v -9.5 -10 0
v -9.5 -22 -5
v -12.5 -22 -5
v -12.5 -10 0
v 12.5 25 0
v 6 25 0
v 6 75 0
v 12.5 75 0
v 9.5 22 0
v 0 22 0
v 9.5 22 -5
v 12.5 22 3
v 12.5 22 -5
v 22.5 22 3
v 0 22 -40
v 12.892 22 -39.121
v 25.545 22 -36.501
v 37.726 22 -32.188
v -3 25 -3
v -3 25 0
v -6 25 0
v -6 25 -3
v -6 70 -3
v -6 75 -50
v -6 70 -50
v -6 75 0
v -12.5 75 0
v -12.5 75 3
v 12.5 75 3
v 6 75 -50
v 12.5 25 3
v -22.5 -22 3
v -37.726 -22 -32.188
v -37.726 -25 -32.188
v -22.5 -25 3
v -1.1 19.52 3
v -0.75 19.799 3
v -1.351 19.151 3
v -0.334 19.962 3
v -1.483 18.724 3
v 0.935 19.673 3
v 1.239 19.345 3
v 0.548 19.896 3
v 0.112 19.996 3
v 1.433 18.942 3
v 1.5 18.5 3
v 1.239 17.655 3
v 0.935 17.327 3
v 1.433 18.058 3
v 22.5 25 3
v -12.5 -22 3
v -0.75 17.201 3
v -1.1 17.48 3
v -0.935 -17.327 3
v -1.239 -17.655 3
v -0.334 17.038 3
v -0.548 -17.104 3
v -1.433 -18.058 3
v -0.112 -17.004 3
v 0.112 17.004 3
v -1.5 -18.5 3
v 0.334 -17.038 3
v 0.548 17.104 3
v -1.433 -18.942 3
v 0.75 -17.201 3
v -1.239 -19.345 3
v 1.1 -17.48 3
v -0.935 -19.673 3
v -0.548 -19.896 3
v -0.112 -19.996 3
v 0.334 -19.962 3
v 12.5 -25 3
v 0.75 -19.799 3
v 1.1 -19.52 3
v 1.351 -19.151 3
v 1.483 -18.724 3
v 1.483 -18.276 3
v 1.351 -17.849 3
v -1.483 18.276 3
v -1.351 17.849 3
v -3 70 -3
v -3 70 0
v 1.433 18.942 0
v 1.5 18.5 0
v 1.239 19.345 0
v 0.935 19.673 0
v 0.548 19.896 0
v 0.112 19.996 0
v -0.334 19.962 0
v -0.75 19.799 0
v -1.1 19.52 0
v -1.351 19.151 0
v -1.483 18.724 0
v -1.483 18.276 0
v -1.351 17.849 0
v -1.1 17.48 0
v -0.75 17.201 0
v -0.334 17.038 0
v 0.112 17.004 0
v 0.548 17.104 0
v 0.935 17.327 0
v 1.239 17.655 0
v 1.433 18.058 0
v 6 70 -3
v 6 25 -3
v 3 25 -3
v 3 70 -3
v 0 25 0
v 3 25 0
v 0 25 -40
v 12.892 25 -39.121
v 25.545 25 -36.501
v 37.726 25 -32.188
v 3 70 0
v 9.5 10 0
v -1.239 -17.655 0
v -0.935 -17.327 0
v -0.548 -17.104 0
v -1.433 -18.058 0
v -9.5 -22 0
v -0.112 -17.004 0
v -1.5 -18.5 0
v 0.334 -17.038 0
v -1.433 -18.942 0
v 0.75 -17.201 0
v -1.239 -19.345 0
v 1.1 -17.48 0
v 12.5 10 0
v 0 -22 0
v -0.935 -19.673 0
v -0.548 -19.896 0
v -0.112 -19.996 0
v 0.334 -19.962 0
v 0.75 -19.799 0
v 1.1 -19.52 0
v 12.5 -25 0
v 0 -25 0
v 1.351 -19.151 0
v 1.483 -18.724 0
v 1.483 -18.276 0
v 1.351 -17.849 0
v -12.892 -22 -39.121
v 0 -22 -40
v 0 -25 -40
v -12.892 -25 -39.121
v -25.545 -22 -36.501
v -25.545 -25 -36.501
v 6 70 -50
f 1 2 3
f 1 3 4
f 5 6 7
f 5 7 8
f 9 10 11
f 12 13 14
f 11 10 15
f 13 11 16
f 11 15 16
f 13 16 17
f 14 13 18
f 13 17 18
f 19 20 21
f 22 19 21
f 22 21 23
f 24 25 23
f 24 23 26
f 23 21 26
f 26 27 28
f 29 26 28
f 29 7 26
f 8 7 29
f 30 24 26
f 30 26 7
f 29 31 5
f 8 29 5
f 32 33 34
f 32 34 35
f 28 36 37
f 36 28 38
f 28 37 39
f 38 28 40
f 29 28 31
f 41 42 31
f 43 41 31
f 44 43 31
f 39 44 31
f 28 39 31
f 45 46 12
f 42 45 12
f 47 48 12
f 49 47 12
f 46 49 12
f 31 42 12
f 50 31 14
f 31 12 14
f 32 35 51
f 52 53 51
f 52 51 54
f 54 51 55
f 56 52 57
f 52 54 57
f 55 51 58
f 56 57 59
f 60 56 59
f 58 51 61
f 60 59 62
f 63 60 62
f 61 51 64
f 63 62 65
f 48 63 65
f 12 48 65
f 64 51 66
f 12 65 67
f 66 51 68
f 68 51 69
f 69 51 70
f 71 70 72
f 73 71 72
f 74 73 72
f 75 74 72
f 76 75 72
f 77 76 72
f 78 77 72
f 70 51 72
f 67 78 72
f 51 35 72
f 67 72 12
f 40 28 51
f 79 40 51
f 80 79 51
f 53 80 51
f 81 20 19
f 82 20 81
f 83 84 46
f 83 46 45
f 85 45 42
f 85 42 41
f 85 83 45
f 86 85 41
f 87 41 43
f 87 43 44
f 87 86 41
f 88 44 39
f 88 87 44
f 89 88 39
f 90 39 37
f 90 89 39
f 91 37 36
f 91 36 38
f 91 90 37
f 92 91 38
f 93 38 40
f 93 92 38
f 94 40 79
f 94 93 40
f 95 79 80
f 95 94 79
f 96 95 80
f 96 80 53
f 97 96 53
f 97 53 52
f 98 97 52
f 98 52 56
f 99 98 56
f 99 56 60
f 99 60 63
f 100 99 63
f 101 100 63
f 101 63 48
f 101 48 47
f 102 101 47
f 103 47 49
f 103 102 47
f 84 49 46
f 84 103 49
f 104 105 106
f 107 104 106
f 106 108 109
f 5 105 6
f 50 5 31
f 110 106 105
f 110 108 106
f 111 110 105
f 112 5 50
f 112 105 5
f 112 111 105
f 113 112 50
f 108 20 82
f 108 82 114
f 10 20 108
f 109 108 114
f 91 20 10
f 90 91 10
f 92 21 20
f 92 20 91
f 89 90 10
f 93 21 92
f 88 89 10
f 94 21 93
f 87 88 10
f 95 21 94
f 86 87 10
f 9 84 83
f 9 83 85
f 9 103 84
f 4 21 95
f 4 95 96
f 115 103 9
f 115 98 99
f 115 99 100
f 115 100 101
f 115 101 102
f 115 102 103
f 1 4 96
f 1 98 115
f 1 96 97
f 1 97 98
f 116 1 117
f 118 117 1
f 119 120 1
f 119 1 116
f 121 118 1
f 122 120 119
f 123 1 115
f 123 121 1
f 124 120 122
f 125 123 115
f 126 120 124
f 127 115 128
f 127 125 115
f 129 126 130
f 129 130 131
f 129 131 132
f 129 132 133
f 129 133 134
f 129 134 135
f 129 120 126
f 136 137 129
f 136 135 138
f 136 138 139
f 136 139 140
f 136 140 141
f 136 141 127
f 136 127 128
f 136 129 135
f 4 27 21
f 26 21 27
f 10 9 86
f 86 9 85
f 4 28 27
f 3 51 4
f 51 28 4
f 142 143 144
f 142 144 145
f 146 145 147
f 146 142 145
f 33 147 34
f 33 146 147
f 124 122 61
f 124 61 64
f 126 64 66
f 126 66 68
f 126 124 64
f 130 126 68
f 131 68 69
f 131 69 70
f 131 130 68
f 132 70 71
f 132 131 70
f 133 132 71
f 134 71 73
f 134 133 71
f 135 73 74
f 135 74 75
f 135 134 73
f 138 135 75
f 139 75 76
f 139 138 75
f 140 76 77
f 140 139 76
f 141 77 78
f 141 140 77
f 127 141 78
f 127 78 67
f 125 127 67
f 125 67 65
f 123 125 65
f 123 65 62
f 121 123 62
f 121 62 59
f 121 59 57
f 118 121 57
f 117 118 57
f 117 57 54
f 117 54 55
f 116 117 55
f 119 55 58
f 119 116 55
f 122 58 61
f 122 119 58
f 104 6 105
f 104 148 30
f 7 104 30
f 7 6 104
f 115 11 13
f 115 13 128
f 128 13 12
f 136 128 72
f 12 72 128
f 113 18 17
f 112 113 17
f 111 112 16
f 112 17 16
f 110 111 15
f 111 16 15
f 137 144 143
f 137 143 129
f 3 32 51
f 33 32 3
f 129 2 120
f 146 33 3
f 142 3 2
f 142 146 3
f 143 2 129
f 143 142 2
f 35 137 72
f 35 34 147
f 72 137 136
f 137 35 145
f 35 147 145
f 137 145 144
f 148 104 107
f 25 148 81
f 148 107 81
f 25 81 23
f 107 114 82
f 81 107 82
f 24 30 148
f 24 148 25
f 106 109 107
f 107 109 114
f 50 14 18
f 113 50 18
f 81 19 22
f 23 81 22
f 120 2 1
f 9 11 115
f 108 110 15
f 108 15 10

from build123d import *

# Parameters (mm, degrees)
SKETCH_1_W               = 25
SKETCH_1_H               = 50
SKETCH_1_R               = 1.5
EXTRUDE_1_DEPTH          = 3
EXTRUDE_START            = 22
EXTRUDE_2_DEPTH          = 3
CUT_EXTRUDE_1_DEPTH      = 3
CUT_EXTRUDE_2_DEPTH      = 3
RIB_1_REACH              = 70.903
SKETCH_7_WALL_W          = 152.805886826
SKETCH_7_WALL_H          = 3
PATTERN_CIRCULAR_1_COUNT = 2
SKETCH_8_W               = 25
SKETCH_8_H               = 3
EXTRUDE_3_DEPTH          = 50
SKETCH_9_W               = 12
SKETCH_9_H               = 5
EXTRUDE_4_DEPTH          = 50
SKETCH_10_W              = 3
SKETCH_10_H              = 45
EXTRUDE_5_DEPTH          = 3


with BuildPart() as part:
    # 草图1 → 凸台-拉伸1 (new body)
    with BuildSketch(Plane.XY):
        Rectangle(SKETCH_1_W, SKETCH_1_H)
        with Locations((0, 18.5)):
            Circle(SKETCH_1_R, mode=Mode.SUBTRACT)
        with Locations((0, -18.5)):
            Circle(SKETCH_1_R, mode=Mode.SUBTRACT)
    extrude(amount=EXTRUDE_1_DEPTH)

    # 草图4 → 凸台-拉伸2 (add)
    with BuildSketch(Plane(origin=(0, 0, 0), x_dir=(1, 0, 0), z_dir=(0, 1, 0)).offset(EXTRUDE_START)):
        with BuildLine():
            Line((-22.5, -3), (22.5, -3))
            Line((22.5, -3), (37.725646944, 32.188161826))
            ThreePointArc((37.725646944, 32.188161826), (0, 40), (-37.725646944, 32.188161826))
            Line((-37.725646944, 32.188161826), (-22.5, -3))
        make_face()
    extrude_2 = extrude(amount=EXTRUDE_2_DEPTH)

    # 镜向1: 凸台-拉伸2 across plane
    add(extrude_2.mirror(Plane.ZX))

    # 草图5 → 切除-拉伸1 (cut)
    with BuildSketch(Plane.XZ.offset(25)):
        Polygon((0, 0), (12.5, 0), (12.5, 3), (39.027541645, 3), (39.027541645, -43.548502894), (0, -43.548502894), align=None)
    extrude(amount=-CUT_EXTRUDE_1_DEPTH, mode=Mode.SUBTRACT)

    # 草图6 → 切除-拉伸2 (cut)
    with BuildSketch(Plane(origin=(0, 25, 0), x_dir=(1, 0, 0), z_dir=(0, 1, 0))):
        Polygon((0, 0), (-12.5, 0), (-12.5, -3), (-39.063803434, -3), (-39.063803434, 42.915846613), (0, 42.915846613), align=None)
    extrude(amount=-CUT_EXTRUDE_2_DEPTH, mode=Mode.SUBTRACT)

    # 草图7 wall → 筋1 (add, up to next)
    with BuildSketch(Plane(origin=(-12.5, -16, -2.5), x_dir=(0, 0.923076923077, 0.384615384615), z_dir=(0, 0.384615384615, -0.923076923077)), mode=Mode.PRIVATE) as rib_1_sk1:
        with Locations((0, 1.5)):
            Rectangle(SKETCH_7_WALL_W, SKETCH_7_WALL_H)
    rib_1_tool1 = extrude(rib_1_sk1.sketch, amount=-RIB_1_REACH, mode=Mode.PRIVATE) - part.part
    rib_1 = rib_1_tool1.solids().sort_by_distance((-12.5, -16, -2.5))[0]
    add(rib_1)

    # 阵列(圆周)1: 筋1 ×2 about axis
    pattern_circular_1_axis = Axis((0, 0, -26.4), (0, 0, 1))
    for i in range(1, PATTERN_CIRCULAR_1_COUNT):
        add(rib_1.rotate(pattern_circular_1_axis, i * 360 / PATTERN_CIRCULAR_1_COUNT))

    # 草图8 → 凸台-拉伸3 (add)
    with BuildSketch(Plane(origin=(0, 25, 0), x_dir=(1, 0, 0), z_dir=(0, 1, 0))):
        with Locations((0, -1.5)):
            Rectangle(SKETCH_8_W, SKETCH_8_H)
    extrude(amount=EXTRUDE_3_DEPTH)

    # 草图9 → 凸台-拉伸4 (add)
    with BuildSketch(Plane(origin=(0, 0, 0), x_dir=(-1, 0, 0), z_dir=(0, 0, -1))):
        with Locations((0, 72.5)):
            Rectangle(SKETCH_9_W, SKETCH_9_H)
    extrude(amount=EXTRUDE_4_DEPTH)

    # 草图10 → 凸台-拉伸5 (add)
    with BuildSketch(Plane(origin=(0, 0, 0), x_dir=(-1, 0, 0), z_dir=(0, 0, -1))):
        with Locations((-4.5, 47.5)):
            Rectangle(SKETCH_10_W, SKETCH_10_H)
        with Locations((4.5, 47.5)):
            Rectangle(SKETCH_10_W, SKETCH_10_H)
    extrude(amount=EXTRUDE_5_DEPTH)


solid = part.part
